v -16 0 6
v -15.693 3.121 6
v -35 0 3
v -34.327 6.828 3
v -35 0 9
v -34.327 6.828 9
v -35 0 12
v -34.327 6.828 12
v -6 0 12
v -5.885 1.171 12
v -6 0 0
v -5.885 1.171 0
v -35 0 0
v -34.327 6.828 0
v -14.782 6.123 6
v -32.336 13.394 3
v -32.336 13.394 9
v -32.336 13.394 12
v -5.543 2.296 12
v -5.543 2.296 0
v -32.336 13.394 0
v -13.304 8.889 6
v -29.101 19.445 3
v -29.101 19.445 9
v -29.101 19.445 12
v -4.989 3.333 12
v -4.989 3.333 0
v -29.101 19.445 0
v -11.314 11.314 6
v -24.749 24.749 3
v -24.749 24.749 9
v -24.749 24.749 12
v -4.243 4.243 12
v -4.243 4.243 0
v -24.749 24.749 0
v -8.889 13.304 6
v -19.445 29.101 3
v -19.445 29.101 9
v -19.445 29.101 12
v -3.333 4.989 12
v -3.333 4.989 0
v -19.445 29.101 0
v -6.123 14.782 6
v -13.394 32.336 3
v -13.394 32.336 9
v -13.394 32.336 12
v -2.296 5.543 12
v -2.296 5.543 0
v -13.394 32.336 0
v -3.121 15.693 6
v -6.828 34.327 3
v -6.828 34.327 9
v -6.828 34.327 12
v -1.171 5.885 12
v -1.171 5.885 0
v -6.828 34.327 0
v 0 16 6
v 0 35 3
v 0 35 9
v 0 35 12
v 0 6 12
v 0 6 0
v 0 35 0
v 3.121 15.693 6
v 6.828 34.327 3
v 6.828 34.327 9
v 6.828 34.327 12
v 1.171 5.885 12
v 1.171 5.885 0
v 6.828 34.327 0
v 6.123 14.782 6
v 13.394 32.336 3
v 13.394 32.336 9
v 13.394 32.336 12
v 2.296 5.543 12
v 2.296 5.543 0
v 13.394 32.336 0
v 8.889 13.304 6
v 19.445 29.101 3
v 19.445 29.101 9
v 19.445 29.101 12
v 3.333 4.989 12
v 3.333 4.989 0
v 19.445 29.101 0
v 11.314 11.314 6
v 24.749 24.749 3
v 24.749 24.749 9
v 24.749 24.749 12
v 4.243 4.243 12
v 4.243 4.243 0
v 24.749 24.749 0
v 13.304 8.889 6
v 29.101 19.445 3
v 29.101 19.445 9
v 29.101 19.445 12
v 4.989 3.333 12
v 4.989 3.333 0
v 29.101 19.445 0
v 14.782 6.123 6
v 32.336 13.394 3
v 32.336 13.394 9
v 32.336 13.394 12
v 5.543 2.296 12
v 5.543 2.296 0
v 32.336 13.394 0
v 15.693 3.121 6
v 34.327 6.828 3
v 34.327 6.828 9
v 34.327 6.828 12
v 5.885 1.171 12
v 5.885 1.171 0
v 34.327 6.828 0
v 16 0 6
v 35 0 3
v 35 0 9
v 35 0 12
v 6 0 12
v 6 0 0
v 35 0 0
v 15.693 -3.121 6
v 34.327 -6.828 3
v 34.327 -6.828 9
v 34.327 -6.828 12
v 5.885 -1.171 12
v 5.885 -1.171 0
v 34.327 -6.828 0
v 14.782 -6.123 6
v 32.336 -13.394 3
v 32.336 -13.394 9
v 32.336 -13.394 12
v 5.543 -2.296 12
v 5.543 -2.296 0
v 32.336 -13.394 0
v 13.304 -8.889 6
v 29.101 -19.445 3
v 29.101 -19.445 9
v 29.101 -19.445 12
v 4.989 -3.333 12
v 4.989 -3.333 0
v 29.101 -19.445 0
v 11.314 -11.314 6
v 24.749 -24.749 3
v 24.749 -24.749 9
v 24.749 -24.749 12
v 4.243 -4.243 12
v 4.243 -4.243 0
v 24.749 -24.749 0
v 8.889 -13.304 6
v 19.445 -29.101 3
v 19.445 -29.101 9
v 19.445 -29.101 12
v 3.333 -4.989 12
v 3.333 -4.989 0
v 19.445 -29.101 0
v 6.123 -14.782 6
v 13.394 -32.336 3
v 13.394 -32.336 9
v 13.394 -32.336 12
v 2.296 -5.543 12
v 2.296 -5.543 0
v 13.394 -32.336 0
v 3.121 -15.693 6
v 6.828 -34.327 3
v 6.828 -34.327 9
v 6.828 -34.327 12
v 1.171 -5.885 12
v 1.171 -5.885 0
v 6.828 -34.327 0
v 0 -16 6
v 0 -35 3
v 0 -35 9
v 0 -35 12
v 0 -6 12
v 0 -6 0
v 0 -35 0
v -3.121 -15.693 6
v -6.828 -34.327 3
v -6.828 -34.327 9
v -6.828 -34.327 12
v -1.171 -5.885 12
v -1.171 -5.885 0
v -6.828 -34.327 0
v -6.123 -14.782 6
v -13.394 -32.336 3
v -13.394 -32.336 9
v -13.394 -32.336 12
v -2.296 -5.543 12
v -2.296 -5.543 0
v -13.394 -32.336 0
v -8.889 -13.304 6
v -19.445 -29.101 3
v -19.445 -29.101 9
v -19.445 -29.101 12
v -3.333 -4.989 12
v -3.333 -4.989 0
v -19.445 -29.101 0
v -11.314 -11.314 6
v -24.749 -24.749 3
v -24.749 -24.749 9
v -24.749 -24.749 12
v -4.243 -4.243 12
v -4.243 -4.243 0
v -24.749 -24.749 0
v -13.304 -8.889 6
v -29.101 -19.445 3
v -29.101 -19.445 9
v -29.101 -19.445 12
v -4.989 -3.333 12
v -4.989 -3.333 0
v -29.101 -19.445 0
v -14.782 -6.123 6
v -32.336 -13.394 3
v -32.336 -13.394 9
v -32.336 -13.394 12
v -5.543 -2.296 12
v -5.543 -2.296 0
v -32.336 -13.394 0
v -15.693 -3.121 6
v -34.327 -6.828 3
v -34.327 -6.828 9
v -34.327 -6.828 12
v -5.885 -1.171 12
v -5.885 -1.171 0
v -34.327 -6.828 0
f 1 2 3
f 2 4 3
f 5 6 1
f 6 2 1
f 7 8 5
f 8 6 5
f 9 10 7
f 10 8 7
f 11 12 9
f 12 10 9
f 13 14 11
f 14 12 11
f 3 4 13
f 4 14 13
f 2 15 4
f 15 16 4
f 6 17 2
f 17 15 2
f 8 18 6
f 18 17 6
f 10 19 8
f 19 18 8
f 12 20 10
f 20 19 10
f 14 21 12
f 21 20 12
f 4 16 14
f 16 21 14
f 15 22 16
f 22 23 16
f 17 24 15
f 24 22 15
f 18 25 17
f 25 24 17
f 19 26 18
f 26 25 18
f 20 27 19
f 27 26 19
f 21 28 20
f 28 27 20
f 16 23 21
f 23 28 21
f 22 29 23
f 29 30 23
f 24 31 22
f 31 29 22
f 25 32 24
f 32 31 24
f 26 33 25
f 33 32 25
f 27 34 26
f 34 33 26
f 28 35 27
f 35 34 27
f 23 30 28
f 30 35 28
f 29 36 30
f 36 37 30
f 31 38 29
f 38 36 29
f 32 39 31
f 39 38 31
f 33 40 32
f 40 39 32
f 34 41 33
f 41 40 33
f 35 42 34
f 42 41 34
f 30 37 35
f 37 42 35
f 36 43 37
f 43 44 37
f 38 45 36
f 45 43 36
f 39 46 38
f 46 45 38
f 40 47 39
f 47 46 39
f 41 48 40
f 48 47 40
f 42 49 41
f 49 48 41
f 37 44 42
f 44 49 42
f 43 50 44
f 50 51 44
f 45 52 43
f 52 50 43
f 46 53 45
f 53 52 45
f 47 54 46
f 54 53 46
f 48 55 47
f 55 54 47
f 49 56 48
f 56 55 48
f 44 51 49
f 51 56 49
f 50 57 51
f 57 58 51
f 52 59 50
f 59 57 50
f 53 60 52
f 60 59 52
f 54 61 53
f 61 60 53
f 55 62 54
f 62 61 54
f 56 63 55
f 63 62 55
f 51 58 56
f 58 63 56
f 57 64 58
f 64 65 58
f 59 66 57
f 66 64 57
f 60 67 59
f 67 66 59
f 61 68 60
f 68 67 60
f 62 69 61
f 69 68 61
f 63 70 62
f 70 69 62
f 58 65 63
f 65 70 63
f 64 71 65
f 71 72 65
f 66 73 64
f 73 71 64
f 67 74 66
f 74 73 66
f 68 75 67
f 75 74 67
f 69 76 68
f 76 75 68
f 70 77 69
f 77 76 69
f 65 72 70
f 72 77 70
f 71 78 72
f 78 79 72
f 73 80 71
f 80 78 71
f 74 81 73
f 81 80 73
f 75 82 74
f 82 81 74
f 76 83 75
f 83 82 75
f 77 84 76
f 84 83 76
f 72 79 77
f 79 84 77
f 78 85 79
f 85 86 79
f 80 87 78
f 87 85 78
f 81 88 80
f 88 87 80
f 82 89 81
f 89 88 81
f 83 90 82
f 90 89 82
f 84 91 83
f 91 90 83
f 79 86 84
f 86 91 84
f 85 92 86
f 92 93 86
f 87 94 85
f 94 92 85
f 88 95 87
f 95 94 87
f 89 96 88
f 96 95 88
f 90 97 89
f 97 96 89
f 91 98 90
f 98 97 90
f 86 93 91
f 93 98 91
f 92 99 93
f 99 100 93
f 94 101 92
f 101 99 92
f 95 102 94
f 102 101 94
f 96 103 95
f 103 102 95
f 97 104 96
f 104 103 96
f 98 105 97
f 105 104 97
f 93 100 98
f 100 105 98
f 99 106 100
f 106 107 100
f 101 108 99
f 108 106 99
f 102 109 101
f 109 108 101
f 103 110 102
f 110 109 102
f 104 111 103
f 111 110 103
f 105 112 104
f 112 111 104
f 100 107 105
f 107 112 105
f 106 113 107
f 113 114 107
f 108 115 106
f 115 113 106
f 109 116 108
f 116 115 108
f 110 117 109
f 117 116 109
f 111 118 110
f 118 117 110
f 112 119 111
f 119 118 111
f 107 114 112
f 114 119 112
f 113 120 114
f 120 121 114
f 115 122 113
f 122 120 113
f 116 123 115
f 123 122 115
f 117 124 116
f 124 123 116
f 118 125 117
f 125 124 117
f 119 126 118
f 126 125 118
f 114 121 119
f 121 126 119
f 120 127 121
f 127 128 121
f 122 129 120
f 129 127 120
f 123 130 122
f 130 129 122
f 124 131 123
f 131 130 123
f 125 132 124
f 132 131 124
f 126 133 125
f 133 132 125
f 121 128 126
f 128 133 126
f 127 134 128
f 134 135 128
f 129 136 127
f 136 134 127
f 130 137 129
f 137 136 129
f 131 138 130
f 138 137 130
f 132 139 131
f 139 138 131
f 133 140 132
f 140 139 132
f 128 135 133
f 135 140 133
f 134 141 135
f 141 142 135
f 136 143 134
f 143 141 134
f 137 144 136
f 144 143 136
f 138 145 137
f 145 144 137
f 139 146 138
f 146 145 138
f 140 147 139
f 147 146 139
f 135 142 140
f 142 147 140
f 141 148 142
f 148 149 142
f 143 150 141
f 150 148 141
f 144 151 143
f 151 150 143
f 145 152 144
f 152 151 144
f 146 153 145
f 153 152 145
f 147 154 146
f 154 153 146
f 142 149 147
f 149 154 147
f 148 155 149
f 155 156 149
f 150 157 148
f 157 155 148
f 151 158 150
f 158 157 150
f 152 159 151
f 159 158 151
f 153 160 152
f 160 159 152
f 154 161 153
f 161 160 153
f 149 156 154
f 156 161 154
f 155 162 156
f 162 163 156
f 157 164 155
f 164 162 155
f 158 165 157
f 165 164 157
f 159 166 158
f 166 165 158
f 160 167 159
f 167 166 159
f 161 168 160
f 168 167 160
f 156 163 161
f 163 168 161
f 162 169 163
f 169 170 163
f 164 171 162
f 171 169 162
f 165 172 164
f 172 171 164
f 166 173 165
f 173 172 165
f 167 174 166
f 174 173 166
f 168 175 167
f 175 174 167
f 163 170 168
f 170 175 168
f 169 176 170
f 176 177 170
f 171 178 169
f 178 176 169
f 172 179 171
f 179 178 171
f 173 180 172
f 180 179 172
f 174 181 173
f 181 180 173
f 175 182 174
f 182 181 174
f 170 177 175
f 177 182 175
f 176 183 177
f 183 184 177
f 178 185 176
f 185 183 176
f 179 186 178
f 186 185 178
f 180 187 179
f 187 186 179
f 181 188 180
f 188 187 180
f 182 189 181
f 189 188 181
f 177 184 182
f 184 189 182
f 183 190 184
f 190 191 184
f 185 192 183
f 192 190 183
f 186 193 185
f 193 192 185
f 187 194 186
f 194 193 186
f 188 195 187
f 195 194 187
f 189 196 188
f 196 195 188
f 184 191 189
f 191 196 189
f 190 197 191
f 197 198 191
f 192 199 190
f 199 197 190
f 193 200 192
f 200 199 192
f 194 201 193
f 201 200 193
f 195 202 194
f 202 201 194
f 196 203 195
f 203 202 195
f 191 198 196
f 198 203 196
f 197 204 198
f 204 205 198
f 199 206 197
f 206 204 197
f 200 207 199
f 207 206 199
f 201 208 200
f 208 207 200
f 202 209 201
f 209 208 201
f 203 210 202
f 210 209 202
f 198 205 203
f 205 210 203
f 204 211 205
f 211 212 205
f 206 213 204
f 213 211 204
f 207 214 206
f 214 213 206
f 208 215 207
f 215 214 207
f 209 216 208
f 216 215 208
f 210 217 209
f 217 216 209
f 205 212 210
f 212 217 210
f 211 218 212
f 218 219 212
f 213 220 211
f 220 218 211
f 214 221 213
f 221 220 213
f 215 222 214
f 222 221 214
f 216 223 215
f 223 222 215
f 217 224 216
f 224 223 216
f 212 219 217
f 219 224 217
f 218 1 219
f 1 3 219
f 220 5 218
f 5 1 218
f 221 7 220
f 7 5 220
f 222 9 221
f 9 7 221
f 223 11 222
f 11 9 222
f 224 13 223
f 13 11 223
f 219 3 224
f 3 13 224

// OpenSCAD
$fn = 32;

// ----------------------------------------------------------------------
// Revolved part: V-groove pulley R35
// ----------------------------------------------------------------------

// --- parameters (mm) ---
bore_r = 6;               // bore radius
rim_r = 35;               // rim radius
rim_t = 12;               // rim width
groove_r = 16;            // groove root radius
groove_w = 3;             // groove half width
revolve_angle = 360;      // revolve sweep, degrees

bore_d = 2 * bore_r;
rim_d = 2 * rim_r;
groove_d = 2 * groove_r;

profile = [[6, 0], [35, 0], [35, 3], [16, 6], [35, 9], [35, 12], [6, 12]];  // primary outline, 7 points, counter clockwise

// --- the one profile operation ---
rotate_extrude(angle = revolve_angle) polygon(points = profile);
